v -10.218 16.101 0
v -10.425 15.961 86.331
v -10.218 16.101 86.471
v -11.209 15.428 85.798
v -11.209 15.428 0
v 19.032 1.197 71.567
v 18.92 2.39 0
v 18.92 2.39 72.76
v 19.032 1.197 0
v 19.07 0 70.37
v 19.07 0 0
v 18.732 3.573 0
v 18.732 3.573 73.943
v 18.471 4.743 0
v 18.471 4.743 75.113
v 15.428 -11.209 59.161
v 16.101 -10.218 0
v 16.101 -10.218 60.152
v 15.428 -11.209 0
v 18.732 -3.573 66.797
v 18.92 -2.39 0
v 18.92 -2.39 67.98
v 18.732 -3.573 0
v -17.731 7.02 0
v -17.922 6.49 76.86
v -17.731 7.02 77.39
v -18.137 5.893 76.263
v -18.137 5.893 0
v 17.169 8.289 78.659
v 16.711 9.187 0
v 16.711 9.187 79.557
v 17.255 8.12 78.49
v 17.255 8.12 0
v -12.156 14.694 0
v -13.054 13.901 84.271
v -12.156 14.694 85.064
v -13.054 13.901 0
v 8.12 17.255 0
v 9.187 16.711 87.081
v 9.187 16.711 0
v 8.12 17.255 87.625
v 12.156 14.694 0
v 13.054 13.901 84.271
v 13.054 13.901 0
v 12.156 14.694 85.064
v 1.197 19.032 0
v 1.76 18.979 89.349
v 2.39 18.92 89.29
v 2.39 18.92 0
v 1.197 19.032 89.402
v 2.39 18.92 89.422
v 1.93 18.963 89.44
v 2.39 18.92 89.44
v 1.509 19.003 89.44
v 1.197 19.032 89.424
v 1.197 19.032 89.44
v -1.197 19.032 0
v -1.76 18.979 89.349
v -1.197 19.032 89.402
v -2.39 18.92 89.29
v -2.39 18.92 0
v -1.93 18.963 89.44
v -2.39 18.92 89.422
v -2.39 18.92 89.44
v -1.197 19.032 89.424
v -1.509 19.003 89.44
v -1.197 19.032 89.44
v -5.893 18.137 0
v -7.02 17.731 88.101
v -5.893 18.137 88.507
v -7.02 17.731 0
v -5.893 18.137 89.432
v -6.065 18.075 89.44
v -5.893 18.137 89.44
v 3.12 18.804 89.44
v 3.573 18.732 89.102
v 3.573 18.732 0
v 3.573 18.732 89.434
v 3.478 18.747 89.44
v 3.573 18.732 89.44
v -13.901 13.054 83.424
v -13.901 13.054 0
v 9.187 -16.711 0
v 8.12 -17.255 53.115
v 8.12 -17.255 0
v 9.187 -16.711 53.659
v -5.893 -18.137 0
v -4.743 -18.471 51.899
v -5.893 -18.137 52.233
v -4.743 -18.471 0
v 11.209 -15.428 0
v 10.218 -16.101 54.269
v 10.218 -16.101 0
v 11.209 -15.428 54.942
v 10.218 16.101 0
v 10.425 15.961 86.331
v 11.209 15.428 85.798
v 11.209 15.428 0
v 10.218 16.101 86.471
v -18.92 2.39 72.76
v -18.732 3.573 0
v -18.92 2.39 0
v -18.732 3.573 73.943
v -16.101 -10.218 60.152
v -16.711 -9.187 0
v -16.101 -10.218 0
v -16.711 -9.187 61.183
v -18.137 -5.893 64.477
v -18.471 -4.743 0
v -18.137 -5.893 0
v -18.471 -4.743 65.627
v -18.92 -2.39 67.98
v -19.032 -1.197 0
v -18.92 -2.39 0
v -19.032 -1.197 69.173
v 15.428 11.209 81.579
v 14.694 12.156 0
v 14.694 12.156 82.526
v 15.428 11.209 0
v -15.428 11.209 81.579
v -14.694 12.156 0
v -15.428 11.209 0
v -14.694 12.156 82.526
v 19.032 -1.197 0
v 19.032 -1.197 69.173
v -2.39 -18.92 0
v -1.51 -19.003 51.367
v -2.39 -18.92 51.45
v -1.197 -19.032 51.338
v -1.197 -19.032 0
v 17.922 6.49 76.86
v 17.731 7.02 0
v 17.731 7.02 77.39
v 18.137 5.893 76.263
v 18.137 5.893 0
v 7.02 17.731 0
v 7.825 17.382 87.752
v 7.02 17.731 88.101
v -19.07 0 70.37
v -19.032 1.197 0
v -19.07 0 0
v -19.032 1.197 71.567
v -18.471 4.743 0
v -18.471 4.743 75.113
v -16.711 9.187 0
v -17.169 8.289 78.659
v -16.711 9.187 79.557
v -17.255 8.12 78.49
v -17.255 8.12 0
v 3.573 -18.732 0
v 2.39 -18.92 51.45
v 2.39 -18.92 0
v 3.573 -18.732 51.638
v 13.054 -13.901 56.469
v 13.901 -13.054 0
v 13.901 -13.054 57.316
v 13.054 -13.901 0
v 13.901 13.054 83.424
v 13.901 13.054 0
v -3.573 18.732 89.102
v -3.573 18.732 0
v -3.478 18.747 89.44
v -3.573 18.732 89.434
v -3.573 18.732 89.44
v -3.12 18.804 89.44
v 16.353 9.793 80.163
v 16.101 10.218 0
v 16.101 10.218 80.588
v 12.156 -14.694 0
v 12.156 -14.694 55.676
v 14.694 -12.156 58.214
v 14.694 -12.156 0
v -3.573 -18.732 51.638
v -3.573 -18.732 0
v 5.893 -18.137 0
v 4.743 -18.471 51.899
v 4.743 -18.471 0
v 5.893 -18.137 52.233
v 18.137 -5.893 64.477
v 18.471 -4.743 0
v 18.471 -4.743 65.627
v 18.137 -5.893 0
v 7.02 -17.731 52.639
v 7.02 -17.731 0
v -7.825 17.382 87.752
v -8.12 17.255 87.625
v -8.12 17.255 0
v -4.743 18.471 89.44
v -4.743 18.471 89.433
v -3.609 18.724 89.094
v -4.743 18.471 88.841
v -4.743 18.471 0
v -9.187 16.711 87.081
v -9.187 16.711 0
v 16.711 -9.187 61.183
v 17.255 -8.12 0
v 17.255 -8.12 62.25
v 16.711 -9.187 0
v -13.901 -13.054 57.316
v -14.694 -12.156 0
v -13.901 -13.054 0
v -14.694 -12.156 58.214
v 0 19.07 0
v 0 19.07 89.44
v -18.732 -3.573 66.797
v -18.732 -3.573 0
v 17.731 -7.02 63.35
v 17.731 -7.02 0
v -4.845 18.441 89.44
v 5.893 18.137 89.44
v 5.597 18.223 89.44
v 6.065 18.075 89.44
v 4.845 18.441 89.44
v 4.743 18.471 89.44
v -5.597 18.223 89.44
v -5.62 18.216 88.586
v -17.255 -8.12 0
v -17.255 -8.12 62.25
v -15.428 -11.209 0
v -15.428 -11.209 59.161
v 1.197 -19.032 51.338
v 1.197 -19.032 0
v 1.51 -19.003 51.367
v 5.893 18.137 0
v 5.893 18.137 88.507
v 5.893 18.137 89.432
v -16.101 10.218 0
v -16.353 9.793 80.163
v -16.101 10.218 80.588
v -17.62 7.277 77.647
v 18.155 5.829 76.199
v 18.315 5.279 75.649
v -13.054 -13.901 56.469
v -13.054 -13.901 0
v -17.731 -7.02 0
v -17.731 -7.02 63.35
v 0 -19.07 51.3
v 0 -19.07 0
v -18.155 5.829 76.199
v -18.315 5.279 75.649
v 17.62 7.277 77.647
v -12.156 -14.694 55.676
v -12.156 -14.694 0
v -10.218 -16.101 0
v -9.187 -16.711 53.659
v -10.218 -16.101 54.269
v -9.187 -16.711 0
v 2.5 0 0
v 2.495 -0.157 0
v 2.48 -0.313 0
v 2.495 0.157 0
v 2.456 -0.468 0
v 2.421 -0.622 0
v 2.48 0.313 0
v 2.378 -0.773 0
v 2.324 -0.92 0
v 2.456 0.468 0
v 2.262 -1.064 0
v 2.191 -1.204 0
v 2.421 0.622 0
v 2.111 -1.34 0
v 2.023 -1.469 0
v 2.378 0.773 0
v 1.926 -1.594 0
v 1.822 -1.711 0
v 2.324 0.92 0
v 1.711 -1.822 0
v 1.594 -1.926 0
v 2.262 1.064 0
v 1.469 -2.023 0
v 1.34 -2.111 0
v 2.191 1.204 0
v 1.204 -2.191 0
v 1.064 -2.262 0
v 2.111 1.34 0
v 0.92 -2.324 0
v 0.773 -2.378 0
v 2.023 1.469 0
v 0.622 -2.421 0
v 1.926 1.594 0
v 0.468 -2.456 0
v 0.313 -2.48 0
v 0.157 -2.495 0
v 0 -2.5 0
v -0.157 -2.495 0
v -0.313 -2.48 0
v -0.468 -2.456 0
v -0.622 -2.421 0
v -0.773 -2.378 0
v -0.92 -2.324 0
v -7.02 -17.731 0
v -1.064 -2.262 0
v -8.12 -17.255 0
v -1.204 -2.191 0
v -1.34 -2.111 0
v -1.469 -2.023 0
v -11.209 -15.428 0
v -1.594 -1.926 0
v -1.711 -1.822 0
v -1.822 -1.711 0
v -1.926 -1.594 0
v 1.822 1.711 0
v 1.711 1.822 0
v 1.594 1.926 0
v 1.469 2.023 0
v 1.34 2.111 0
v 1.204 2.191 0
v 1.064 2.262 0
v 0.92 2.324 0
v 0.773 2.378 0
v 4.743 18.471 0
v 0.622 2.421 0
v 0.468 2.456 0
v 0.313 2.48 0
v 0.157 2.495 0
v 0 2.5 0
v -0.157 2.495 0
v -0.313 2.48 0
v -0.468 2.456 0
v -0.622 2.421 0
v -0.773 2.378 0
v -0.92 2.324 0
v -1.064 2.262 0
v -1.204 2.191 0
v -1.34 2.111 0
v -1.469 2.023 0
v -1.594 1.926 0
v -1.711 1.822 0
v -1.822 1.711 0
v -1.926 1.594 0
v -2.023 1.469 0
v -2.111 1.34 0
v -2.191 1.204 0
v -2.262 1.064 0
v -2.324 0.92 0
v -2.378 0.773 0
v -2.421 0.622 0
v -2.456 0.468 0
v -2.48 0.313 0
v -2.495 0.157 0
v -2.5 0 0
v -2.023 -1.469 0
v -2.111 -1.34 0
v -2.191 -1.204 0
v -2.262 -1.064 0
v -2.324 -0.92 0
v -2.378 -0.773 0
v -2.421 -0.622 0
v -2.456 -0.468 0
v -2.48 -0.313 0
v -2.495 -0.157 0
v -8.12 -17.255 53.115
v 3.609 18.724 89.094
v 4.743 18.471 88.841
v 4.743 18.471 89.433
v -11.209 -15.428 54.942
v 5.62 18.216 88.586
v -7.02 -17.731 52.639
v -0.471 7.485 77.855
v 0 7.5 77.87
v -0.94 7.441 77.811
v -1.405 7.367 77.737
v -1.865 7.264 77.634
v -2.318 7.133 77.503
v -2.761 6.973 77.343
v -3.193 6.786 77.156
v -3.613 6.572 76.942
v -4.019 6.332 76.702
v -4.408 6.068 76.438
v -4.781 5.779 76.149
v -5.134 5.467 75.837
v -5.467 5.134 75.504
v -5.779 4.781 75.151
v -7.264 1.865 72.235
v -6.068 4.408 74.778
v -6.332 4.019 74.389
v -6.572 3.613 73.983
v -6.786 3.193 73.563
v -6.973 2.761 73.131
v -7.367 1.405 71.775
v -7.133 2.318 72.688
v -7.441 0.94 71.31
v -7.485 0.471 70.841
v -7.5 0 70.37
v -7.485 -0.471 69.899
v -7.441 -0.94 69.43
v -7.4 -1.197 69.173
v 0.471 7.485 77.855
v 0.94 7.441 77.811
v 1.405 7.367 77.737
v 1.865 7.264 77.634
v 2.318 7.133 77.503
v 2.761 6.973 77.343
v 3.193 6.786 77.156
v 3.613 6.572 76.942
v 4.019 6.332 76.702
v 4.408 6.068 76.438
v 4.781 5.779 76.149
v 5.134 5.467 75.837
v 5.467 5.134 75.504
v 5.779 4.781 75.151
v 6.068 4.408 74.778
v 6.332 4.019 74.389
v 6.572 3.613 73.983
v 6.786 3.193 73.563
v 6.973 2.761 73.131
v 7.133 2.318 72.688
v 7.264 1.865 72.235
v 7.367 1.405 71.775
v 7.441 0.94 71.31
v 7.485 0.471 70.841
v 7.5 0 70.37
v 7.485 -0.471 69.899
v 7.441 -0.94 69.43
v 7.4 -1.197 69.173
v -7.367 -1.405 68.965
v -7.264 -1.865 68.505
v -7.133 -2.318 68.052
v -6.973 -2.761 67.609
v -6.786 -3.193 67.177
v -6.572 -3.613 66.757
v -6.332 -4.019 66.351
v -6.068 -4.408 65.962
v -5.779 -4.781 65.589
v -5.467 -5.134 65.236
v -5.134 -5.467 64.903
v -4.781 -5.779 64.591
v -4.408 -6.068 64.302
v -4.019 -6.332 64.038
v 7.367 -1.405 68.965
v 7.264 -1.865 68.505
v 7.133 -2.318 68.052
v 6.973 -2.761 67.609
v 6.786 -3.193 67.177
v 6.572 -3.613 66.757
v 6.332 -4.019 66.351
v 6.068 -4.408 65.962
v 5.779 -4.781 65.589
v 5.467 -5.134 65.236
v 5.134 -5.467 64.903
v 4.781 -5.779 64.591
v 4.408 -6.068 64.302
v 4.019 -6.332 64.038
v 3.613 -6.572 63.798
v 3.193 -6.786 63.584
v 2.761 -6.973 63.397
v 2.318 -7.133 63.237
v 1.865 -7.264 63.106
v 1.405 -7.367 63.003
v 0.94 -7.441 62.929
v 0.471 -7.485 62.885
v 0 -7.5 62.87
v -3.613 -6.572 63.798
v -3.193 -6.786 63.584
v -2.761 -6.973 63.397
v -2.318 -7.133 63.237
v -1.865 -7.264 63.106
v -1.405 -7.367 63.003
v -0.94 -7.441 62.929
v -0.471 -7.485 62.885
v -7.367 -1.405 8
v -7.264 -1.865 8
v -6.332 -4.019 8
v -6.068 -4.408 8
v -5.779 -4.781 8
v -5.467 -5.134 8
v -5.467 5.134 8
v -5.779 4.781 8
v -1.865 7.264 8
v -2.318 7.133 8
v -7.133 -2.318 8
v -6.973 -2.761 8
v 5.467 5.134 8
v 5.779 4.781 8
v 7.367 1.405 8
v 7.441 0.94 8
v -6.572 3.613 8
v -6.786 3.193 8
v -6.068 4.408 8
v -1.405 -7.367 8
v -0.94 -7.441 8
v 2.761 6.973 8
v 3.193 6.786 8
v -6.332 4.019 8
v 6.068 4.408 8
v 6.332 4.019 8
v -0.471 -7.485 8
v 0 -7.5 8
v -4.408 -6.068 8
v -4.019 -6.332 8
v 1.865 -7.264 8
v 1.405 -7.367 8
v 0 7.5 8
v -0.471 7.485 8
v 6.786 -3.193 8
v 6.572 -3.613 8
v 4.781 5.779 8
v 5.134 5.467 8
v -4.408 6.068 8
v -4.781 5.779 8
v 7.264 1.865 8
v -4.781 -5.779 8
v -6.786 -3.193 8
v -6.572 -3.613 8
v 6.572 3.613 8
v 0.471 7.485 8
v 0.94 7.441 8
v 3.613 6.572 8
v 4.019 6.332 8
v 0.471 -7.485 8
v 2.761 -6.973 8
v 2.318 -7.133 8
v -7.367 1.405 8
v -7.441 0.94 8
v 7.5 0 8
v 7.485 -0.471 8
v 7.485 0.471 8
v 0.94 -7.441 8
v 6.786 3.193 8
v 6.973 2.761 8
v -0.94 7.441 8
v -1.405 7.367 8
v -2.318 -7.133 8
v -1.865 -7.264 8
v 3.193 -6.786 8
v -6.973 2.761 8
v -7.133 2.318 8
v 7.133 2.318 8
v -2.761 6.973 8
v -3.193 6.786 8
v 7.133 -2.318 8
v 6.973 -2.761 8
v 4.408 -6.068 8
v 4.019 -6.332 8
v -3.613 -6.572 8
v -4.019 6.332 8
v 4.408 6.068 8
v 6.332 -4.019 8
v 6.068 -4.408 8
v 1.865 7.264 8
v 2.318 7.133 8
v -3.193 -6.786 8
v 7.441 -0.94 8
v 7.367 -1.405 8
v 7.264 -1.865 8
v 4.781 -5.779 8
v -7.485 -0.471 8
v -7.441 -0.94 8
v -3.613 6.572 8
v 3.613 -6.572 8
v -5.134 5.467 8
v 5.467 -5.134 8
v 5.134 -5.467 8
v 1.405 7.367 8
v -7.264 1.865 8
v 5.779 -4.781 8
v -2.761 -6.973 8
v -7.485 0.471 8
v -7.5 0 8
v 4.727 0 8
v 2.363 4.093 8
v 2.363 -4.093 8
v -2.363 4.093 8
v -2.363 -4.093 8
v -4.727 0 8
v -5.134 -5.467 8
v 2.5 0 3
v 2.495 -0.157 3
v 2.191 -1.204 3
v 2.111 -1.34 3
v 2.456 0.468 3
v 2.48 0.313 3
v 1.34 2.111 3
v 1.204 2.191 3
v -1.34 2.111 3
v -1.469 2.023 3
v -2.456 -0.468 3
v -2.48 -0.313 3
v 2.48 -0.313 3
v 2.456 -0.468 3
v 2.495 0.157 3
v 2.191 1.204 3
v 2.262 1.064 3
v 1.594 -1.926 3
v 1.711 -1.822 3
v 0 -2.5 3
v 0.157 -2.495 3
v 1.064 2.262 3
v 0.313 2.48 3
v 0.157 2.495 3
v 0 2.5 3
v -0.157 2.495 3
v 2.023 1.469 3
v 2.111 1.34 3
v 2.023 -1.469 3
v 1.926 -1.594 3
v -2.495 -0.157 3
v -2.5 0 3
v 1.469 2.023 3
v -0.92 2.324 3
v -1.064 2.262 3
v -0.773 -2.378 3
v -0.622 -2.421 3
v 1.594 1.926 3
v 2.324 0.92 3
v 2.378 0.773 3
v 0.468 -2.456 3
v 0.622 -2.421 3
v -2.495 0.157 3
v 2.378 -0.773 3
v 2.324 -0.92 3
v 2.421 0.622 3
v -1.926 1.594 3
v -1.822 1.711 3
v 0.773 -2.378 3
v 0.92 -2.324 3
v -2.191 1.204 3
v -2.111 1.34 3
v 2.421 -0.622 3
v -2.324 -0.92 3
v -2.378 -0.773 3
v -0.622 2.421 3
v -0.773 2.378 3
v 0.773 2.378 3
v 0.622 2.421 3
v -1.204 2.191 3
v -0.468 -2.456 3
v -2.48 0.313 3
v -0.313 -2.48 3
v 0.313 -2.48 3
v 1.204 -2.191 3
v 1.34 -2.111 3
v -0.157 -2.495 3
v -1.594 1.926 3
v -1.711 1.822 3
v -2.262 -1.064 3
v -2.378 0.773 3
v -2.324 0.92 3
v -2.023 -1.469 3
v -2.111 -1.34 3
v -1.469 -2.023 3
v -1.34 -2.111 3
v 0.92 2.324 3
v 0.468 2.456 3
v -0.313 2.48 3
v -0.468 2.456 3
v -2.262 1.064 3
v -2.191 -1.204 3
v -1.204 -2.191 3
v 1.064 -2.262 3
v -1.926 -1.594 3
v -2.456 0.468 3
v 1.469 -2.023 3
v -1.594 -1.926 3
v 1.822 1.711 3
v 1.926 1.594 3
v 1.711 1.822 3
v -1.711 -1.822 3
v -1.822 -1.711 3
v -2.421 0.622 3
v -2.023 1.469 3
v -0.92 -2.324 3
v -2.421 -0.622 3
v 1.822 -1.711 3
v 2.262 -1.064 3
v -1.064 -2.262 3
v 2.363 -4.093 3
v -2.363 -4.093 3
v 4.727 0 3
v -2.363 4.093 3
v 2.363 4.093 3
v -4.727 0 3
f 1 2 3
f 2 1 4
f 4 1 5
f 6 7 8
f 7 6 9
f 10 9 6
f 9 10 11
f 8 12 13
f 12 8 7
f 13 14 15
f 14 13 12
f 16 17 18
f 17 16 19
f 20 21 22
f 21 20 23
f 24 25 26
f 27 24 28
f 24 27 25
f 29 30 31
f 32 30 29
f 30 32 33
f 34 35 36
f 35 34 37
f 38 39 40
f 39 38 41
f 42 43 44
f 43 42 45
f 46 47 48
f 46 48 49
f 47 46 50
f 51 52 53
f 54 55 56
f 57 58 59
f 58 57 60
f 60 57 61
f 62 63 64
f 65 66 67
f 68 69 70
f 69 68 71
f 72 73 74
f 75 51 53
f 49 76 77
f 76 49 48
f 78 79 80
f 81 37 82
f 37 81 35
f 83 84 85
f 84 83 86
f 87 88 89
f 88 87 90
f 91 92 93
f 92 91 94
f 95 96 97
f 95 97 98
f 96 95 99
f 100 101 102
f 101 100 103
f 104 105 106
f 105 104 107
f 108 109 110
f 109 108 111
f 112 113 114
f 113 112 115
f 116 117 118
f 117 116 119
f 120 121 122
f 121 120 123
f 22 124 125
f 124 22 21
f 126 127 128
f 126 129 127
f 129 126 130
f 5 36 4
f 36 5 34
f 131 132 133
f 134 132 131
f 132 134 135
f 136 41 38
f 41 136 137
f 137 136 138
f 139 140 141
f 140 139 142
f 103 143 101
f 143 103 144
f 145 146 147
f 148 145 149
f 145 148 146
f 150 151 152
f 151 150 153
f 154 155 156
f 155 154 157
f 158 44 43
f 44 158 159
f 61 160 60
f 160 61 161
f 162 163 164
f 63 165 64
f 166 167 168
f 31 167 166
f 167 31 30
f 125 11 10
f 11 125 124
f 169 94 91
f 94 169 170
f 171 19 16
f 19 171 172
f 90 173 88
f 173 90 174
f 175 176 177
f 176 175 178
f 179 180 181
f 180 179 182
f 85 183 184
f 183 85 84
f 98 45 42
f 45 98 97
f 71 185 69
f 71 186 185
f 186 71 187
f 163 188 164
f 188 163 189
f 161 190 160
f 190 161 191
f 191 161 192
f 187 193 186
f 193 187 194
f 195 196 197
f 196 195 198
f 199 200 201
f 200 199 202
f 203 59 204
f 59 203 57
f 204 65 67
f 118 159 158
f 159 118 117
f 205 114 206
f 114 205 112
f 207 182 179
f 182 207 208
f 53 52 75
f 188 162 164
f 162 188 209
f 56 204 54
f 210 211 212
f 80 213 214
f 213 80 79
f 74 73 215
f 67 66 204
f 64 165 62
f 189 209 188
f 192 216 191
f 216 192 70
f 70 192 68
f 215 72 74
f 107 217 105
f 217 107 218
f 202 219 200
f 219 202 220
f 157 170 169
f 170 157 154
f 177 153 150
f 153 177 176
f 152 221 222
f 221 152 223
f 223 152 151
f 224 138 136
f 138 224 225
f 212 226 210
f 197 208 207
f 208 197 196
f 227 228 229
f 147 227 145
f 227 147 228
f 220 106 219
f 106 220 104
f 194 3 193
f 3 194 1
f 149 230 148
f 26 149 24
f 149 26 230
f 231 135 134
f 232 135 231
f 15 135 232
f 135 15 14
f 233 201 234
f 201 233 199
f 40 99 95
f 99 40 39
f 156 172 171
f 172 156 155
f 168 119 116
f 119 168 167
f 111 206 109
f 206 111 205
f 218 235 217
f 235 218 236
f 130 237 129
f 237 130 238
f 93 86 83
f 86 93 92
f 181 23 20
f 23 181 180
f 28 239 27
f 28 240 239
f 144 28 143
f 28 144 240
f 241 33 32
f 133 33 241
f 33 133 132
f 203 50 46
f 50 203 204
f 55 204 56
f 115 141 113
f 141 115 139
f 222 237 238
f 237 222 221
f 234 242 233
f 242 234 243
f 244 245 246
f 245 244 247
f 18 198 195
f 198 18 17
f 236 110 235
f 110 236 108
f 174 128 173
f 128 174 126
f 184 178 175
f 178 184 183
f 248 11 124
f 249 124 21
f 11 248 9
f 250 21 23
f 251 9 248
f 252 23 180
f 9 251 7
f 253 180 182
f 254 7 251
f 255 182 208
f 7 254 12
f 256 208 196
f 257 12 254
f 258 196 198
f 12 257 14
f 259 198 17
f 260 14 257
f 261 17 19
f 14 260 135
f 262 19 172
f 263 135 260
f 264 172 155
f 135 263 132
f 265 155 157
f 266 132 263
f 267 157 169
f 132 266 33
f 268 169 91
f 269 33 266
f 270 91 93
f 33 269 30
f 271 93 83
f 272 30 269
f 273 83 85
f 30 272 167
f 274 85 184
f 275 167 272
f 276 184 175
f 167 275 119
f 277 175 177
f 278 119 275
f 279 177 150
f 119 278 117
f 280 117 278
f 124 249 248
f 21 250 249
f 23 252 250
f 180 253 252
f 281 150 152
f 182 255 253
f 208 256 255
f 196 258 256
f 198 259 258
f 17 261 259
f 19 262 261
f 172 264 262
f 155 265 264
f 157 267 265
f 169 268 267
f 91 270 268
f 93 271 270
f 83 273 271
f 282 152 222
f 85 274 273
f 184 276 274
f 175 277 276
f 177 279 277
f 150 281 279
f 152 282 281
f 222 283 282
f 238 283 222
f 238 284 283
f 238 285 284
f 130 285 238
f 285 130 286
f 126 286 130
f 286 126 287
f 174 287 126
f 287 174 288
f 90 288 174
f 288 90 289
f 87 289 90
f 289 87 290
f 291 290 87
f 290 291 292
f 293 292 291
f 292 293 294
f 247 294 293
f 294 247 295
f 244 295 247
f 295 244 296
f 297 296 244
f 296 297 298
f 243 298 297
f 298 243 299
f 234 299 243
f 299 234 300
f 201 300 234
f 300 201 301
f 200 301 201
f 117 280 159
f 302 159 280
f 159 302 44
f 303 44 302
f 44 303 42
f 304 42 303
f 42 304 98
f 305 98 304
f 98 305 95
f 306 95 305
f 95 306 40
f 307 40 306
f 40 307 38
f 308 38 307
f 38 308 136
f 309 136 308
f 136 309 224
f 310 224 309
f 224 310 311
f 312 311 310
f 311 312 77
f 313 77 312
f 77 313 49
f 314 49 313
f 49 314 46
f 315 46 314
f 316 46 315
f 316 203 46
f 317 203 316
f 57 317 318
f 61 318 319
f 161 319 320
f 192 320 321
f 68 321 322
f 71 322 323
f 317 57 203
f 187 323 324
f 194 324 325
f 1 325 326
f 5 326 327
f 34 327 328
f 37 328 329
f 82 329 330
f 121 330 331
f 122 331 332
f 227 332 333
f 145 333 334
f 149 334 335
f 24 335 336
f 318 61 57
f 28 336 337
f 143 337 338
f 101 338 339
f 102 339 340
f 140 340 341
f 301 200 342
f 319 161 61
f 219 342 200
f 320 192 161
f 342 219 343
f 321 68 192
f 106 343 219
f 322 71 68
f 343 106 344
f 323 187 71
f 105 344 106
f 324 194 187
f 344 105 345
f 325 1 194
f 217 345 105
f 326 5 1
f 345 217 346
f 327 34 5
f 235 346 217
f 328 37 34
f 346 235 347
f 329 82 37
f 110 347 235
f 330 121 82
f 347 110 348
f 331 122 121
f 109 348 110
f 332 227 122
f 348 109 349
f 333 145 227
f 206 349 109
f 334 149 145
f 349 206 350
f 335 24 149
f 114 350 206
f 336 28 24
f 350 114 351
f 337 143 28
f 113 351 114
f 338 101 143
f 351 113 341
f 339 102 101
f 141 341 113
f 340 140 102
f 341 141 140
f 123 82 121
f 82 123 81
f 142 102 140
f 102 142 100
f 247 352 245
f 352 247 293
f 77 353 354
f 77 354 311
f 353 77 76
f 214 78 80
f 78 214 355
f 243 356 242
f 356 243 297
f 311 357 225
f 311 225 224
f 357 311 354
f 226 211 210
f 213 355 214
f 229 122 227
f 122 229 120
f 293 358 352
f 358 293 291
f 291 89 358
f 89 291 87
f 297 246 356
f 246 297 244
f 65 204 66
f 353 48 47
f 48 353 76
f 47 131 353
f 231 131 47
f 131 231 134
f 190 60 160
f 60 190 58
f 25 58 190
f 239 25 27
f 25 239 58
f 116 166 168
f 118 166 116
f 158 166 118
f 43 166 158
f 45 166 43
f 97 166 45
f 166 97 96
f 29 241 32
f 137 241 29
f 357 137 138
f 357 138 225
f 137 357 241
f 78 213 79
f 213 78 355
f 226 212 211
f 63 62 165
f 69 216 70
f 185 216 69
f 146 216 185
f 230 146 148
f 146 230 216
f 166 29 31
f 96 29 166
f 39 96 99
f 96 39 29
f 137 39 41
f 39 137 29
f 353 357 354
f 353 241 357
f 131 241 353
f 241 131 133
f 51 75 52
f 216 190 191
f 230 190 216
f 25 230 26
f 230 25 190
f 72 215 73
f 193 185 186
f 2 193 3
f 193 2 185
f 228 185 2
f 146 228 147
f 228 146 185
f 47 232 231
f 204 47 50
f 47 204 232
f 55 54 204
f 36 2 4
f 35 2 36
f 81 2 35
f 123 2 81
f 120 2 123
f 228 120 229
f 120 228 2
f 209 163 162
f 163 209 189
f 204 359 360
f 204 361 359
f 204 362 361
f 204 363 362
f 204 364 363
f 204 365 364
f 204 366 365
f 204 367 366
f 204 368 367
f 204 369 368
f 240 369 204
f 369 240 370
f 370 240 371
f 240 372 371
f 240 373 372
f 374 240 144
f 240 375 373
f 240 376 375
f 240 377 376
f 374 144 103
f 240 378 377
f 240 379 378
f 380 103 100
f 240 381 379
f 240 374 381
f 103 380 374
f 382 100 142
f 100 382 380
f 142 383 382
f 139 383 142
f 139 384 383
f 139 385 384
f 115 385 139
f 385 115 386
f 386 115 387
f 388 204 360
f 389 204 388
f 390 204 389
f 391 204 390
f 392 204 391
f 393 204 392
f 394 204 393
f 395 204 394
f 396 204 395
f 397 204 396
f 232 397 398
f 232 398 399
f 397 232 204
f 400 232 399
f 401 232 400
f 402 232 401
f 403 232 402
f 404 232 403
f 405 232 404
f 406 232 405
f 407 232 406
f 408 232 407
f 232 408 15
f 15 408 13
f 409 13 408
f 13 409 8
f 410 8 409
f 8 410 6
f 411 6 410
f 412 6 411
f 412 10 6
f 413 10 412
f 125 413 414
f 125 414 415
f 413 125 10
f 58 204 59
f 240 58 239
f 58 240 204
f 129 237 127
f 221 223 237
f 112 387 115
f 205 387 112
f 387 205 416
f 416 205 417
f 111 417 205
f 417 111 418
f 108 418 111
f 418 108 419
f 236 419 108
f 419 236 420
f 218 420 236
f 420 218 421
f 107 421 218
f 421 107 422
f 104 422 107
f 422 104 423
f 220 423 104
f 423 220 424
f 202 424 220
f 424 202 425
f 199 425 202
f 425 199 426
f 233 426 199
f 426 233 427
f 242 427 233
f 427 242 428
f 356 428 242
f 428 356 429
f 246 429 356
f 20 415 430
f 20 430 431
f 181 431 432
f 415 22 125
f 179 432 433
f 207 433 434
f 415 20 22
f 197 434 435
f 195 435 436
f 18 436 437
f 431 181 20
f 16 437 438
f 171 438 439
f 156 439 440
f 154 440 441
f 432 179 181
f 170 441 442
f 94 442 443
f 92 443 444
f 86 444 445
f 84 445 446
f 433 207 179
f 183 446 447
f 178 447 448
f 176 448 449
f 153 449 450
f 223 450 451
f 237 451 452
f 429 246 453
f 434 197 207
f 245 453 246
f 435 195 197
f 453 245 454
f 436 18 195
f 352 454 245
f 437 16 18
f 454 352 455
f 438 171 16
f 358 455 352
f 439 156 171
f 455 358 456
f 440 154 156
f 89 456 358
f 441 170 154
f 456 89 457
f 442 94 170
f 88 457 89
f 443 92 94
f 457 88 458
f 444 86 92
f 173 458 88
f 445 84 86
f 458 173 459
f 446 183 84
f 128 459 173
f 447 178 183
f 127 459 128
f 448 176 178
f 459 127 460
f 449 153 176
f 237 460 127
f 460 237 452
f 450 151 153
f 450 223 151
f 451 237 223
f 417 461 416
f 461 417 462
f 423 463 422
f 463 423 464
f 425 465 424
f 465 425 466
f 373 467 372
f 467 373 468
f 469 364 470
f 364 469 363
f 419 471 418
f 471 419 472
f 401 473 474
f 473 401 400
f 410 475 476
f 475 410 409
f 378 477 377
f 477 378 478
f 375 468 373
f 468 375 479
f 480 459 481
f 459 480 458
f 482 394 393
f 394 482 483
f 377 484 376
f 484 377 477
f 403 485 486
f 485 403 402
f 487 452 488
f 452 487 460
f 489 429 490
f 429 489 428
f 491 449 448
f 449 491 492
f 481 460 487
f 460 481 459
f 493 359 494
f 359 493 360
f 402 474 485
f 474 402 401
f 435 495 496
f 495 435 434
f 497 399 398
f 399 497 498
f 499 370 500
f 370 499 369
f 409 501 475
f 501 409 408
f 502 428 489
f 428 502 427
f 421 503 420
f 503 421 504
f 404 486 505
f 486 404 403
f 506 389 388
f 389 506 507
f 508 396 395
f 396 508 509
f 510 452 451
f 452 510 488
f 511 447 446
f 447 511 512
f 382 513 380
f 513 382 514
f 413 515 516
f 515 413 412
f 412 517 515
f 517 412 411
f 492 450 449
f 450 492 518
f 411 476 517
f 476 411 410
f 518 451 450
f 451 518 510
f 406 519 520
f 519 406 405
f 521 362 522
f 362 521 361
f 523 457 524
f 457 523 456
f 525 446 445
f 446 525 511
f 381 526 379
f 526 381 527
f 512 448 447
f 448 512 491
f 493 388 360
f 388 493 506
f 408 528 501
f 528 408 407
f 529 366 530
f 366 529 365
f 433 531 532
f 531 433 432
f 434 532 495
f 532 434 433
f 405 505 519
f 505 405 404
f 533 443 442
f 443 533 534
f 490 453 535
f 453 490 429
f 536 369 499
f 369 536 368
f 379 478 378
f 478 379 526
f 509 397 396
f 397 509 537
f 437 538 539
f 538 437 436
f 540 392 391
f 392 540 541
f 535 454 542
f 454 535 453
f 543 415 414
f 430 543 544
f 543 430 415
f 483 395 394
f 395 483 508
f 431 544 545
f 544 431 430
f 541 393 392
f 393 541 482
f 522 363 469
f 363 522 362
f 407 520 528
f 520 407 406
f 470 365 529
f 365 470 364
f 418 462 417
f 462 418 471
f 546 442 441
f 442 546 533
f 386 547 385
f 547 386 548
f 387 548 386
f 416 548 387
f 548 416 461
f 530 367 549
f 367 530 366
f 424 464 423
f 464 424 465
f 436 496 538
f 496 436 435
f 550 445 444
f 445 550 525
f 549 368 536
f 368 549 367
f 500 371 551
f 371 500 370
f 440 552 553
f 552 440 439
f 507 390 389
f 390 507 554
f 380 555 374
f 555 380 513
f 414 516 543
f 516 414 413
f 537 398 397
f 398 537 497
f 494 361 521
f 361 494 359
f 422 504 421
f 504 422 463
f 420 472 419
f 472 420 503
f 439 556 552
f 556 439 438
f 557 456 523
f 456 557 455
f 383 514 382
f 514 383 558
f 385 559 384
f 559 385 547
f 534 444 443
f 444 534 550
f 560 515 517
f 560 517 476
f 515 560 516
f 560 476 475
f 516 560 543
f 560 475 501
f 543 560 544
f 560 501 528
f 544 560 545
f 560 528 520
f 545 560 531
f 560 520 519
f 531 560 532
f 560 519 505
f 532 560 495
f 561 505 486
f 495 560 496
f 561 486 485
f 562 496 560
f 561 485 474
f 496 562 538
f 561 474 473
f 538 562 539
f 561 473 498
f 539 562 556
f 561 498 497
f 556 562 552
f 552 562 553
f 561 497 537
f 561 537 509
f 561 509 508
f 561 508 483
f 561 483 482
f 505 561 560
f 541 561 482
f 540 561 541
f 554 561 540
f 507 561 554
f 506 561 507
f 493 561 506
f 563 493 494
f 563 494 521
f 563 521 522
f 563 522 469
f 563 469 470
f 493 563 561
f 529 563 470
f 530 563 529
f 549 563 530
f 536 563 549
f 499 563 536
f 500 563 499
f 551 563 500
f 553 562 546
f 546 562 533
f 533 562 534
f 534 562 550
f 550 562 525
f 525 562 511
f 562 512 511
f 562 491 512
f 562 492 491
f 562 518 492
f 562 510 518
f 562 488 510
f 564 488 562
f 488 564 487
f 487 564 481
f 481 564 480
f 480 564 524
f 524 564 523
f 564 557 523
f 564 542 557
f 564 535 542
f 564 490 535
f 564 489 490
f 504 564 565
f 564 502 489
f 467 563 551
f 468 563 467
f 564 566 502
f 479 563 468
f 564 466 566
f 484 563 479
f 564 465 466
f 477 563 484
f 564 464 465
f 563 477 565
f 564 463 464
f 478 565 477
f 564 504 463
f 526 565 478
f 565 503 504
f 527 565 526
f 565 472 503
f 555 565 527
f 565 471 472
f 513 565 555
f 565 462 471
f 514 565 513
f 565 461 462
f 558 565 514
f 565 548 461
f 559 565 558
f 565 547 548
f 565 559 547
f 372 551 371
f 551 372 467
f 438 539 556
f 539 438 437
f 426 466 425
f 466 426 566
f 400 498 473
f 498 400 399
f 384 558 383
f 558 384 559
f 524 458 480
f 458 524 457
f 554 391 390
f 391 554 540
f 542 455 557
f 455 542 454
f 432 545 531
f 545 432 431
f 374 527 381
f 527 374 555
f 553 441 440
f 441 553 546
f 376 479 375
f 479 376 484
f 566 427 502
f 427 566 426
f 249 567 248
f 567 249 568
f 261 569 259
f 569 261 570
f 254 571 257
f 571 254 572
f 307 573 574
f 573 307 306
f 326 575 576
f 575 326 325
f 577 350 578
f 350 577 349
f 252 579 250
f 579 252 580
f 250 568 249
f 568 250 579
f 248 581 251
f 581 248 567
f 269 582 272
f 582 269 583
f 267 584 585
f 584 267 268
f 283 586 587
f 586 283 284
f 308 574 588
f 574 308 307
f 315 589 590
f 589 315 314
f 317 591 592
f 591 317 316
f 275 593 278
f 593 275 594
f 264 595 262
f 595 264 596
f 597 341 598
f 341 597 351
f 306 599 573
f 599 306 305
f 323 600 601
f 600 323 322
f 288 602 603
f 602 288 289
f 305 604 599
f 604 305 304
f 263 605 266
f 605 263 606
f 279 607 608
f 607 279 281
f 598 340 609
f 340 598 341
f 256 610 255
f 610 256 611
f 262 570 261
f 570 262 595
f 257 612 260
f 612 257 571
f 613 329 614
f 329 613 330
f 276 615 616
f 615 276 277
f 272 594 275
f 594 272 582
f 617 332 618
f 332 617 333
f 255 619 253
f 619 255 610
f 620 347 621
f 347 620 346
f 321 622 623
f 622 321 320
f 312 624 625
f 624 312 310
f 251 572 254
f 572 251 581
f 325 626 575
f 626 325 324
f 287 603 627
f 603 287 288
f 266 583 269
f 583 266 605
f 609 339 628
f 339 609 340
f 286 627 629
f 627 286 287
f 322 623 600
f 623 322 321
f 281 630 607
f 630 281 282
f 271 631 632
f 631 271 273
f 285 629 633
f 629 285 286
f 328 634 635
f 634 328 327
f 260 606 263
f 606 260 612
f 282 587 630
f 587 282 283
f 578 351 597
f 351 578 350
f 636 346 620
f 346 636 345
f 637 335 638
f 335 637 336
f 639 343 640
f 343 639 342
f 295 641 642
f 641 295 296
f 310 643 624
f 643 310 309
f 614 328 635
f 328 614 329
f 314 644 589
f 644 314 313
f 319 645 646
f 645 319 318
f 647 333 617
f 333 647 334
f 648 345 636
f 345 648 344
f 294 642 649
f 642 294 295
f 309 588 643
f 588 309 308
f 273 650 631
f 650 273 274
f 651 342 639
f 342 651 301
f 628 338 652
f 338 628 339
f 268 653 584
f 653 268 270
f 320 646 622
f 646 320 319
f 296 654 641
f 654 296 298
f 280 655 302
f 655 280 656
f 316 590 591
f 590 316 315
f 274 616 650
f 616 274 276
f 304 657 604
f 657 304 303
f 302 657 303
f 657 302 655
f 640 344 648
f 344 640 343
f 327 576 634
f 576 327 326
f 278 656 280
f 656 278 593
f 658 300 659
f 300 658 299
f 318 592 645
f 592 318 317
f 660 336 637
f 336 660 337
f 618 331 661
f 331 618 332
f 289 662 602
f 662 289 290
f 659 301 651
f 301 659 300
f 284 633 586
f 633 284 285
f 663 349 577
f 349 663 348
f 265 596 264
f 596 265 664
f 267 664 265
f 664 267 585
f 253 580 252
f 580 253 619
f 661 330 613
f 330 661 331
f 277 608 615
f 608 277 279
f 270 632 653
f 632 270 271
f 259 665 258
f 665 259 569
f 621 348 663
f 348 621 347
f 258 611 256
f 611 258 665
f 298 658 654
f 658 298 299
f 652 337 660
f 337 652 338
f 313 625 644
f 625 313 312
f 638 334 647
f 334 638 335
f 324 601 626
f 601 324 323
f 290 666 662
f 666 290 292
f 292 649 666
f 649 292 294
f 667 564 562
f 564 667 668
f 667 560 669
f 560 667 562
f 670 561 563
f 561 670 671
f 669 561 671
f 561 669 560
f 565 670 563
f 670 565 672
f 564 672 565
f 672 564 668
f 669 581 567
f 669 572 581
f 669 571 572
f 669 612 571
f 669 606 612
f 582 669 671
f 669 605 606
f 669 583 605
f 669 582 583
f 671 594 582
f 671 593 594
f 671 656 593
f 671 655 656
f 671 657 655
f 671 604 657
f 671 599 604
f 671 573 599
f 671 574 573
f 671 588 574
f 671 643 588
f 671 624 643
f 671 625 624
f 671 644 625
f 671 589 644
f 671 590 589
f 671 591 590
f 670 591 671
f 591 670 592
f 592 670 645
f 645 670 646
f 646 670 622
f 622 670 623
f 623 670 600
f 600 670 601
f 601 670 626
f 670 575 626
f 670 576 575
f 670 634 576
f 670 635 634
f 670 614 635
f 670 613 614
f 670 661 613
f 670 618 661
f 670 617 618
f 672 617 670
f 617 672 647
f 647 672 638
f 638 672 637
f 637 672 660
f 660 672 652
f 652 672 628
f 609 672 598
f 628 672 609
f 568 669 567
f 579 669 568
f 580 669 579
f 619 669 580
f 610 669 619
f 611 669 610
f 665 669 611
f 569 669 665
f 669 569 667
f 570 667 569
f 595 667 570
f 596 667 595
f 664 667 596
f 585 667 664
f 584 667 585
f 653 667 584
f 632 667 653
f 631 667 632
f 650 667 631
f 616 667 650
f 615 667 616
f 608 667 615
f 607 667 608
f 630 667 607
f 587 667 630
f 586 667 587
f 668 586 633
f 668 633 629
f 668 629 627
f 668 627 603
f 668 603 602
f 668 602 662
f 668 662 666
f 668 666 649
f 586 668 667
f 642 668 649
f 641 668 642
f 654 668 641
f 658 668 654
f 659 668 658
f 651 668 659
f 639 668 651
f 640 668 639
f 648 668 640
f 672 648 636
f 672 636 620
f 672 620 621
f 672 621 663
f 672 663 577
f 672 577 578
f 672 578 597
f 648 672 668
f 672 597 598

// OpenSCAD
Secondary_Mirror();

module Secondary_Mirror(){
    
    $s2 = sqrt(2);
$HPart = 89.44;
$diam = 38.14;
$Tslice = $diam*$s2/2;
$fn=100;

$Hnut = 5;
$Wnut = 8.1;
$Wnutfloor = 3;
difference()
{
difference() //cut off a 45 degree chunk at the right height
{
translate([0,0,$HPart/2])
  cylinder(h=$HPart,d=$diam,center=true); //create main body

translate([0,0,$HPart-$diam/2])
  translate([0,-$s2/2*($Tslice/2),-$s2/2*($Tslice/2)+$s2*$Tslice/2])
    rotate([45,0,0])  
      cylinder(h=$Tslice,d=$s2*$diam,center=true); //create cutter
}

union()
{
translate([0,0,$Wnutfloor+$Hnut])
  cylinder(d=15,h=$HPart); //wide well to seat nut
translate([0,0,-1])
  cylinder(d=5,h=$HPart); //hole for screw
translate([0,0,$Wnutfloor])
  cylinder(r = $Wnut / 2 / cos(180 / 6) + 0.05, h=$Hnut, $fn=6); //M5 nut

}    
}}
